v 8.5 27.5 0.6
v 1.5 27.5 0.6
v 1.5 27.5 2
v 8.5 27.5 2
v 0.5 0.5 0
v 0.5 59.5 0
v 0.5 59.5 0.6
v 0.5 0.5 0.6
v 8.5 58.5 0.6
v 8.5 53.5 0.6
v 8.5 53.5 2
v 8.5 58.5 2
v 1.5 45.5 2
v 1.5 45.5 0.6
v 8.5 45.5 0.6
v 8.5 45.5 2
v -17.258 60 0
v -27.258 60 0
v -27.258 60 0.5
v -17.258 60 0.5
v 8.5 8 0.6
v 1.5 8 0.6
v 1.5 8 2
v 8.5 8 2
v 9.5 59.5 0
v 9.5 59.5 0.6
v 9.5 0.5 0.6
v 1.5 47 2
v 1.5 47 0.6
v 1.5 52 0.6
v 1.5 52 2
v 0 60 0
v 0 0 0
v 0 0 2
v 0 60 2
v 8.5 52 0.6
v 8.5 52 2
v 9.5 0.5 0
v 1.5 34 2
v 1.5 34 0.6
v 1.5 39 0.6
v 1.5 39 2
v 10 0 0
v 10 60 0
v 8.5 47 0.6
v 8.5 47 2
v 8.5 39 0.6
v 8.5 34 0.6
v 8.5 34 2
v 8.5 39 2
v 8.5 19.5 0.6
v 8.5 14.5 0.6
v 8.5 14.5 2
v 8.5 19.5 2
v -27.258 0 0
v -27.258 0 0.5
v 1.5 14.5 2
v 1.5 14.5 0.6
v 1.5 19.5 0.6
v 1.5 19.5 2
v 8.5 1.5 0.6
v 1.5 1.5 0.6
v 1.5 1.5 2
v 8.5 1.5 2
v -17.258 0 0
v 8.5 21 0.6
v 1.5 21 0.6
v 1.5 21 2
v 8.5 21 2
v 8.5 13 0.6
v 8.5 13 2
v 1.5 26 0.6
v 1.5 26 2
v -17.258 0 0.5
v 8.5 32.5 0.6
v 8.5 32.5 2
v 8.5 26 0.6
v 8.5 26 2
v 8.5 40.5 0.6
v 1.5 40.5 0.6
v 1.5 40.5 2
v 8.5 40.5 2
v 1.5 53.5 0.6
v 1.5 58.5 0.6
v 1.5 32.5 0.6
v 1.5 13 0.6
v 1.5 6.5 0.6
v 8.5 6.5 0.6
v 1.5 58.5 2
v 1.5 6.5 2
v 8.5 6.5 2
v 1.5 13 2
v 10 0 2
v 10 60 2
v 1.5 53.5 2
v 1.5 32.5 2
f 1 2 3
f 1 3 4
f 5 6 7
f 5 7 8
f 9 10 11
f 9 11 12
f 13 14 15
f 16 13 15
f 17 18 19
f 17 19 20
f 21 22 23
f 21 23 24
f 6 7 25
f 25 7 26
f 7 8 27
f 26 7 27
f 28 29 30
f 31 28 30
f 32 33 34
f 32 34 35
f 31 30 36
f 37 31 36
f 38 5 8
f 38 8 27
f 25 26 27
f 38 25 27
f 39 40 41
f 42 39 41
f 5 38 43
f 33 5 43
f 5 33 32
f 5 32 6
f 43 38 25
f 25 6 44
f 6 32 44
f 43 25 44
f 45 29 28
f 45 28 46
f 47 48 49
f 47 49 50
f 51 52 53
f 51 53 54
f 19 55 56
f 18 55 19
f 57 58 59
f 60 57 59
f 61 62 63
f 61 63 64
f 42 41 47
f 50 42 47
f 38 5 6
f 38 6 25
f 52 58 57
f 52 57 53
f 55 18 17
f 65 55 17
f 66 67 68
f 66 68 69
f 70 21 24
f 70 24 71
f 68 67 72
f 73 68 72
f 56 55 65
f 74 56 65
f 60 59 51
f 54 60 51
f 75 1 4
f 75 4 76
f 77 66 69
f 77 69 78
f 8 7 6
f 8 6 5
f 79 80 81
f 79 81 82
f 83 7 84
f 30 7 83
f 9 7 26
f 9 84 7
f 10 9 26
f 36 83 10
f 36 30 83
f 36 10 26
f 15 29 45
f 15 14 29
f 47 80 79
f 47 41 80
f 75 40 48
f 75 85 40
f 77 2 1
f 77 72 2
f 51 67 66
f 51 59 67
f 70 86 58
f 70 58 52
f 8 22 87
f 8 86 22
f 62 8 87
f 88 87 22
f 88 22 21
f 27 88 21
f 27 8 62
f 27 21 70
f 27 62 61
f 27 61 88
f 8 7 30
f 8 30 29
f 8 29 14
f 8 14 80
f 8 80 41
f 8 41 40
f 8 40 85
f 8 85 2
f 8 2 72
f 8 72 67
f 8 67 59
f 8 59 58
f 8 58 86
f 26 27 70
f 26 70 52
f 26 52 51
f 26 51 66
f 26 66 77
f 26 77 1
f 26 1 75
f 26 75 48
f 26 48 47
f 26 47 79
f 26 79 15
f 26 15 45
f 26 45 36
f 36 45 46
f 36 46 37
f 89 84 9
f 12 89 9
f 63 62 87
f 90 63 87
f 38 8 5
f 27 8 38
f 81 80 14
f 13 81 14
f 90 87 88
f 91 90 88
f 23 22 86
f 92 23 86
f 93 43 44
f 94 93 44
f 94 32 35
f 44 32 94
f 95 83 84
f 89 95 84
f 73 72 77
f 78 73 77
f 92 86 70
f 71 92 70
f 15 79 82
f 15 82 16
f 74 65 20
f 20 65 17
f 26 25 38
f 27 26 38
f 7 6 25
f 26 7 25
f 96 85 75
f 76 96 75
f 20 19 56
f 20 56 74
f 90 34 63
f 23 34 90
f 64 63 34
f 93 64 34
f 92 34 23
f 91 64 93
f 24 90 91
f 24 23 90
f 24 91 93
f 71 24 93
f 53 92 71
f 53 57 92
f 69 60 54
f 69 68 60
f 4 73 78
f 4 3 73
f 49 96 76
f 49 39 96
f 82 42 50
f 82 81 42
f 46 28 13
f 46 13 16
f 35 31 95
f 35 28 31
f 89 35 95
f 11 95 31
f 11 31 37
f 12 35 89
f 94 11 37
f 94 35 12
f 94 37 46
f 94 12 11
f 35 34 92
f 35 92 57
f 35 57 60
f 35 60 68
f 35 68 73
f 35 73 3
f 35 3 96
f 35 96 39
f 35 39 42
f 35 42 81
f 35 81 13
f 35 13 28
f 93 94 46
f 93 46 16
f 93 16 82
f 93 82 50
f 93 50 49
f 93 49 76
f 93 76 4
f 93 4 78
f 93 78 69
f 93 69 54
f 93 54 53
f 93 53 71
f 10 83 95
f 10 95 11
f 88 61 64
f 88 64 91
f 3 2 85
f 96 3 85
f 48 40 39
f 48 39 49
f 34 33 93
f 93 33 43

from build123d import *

# Parameters (mm, degrees)
F0_W     = 10
F0_H     = 60
F0_W_2   = 7
F0_H_2   = 5
F1_DEPTH = 2
F2_W     = 10
F2_H     = 60
F3_DEPTH = 0.5
F4_W     = 9
F4_H     = 59
F5_DEPTH = 0.6
F6_W     = 9
F6_H     = 59
F7_DEPTH = 0.6


with BuildPart() as f1:
    # F0 (on Top) → F1 (new body)
    with BuildSketch(Plane.XY):
        with Locations((5, 30)):
            Rectangle(F0_W, F0_H)
        with Locations((5, 4)):
            Rectangle(F0_W_2, F0_H_2, mode=Mode.SUBTRACT)
        with Locations((5, 10.5)):
            Rectangle(F0_W_2, F0_H_2, mode=Mode.SUBTRACT)
        with Locations((5, 17)):
            Rectangle(F0_W_2, F0_H_2, mode=Mode.SUBTRACT)
        with Locations((5, 23.5)):
            Rectangle(F0_W_2, F0_H_2, mode=Mode.SUBTRACT)
        with Locations((5, 30)):
            Rectangle(F0_W_2, F0_H_2, mode=Mode.SUBTRACT)
        with Locations((5, 36.5)):
            Rectangle(F0_W_2, F0_H_2, mode=Mode.SUBTRACT)
        with Locations((5, 43)):
            Rectangle(F0_W_2, F0_H_2, mode=Mode.SUBTRACT)
        with Locations((5, 49.5)):
            Rectangle(F0_W_2, F0_H_2, mode=Mode.SUBTRACT)
        with Locations((5, 56)):
            Rectangle(F0_W_2, F0_H_2, mode=Mode.SUBTRACT)
    extrude(amount=F1_DEPTH)

    # F4 (on face) → F5 (cut)
    with BuildSketch(Plane(origin=(0, 0, 0), x_dir=(1, 0, 0), z_dir=(0, 0, -1))):
        with Locations((5, -30)):
            Rectangle(F4_W, F4_H)
    extrude(amount=-F5_DEPTH, mode=Mode.SUBTRACT)


with BuildPart() as f3:
    # F2 (on Top) → F3 (new body)
    with BuildSketch(Plane.XY):
        with Locations((-22.258061, 30)):
            Rectangle(F2_W, F2_H)
    extrude(amount=F3_DEPTH)


with BuildPart() as f7:
    # F6 (on face) → F7 (new body)
    with BuildSketch(Plane(origin=(0, 0, 0.6), x_dir=(1, 0, 0), z_dir=(0, 0, -1))):
        with Locations((5, -30)):
            Rectangle(F6_W, F6_H)
    extrude(amount=F7_DEPTH)


solid = Compound([f1.part, f3.part, f7.part])
